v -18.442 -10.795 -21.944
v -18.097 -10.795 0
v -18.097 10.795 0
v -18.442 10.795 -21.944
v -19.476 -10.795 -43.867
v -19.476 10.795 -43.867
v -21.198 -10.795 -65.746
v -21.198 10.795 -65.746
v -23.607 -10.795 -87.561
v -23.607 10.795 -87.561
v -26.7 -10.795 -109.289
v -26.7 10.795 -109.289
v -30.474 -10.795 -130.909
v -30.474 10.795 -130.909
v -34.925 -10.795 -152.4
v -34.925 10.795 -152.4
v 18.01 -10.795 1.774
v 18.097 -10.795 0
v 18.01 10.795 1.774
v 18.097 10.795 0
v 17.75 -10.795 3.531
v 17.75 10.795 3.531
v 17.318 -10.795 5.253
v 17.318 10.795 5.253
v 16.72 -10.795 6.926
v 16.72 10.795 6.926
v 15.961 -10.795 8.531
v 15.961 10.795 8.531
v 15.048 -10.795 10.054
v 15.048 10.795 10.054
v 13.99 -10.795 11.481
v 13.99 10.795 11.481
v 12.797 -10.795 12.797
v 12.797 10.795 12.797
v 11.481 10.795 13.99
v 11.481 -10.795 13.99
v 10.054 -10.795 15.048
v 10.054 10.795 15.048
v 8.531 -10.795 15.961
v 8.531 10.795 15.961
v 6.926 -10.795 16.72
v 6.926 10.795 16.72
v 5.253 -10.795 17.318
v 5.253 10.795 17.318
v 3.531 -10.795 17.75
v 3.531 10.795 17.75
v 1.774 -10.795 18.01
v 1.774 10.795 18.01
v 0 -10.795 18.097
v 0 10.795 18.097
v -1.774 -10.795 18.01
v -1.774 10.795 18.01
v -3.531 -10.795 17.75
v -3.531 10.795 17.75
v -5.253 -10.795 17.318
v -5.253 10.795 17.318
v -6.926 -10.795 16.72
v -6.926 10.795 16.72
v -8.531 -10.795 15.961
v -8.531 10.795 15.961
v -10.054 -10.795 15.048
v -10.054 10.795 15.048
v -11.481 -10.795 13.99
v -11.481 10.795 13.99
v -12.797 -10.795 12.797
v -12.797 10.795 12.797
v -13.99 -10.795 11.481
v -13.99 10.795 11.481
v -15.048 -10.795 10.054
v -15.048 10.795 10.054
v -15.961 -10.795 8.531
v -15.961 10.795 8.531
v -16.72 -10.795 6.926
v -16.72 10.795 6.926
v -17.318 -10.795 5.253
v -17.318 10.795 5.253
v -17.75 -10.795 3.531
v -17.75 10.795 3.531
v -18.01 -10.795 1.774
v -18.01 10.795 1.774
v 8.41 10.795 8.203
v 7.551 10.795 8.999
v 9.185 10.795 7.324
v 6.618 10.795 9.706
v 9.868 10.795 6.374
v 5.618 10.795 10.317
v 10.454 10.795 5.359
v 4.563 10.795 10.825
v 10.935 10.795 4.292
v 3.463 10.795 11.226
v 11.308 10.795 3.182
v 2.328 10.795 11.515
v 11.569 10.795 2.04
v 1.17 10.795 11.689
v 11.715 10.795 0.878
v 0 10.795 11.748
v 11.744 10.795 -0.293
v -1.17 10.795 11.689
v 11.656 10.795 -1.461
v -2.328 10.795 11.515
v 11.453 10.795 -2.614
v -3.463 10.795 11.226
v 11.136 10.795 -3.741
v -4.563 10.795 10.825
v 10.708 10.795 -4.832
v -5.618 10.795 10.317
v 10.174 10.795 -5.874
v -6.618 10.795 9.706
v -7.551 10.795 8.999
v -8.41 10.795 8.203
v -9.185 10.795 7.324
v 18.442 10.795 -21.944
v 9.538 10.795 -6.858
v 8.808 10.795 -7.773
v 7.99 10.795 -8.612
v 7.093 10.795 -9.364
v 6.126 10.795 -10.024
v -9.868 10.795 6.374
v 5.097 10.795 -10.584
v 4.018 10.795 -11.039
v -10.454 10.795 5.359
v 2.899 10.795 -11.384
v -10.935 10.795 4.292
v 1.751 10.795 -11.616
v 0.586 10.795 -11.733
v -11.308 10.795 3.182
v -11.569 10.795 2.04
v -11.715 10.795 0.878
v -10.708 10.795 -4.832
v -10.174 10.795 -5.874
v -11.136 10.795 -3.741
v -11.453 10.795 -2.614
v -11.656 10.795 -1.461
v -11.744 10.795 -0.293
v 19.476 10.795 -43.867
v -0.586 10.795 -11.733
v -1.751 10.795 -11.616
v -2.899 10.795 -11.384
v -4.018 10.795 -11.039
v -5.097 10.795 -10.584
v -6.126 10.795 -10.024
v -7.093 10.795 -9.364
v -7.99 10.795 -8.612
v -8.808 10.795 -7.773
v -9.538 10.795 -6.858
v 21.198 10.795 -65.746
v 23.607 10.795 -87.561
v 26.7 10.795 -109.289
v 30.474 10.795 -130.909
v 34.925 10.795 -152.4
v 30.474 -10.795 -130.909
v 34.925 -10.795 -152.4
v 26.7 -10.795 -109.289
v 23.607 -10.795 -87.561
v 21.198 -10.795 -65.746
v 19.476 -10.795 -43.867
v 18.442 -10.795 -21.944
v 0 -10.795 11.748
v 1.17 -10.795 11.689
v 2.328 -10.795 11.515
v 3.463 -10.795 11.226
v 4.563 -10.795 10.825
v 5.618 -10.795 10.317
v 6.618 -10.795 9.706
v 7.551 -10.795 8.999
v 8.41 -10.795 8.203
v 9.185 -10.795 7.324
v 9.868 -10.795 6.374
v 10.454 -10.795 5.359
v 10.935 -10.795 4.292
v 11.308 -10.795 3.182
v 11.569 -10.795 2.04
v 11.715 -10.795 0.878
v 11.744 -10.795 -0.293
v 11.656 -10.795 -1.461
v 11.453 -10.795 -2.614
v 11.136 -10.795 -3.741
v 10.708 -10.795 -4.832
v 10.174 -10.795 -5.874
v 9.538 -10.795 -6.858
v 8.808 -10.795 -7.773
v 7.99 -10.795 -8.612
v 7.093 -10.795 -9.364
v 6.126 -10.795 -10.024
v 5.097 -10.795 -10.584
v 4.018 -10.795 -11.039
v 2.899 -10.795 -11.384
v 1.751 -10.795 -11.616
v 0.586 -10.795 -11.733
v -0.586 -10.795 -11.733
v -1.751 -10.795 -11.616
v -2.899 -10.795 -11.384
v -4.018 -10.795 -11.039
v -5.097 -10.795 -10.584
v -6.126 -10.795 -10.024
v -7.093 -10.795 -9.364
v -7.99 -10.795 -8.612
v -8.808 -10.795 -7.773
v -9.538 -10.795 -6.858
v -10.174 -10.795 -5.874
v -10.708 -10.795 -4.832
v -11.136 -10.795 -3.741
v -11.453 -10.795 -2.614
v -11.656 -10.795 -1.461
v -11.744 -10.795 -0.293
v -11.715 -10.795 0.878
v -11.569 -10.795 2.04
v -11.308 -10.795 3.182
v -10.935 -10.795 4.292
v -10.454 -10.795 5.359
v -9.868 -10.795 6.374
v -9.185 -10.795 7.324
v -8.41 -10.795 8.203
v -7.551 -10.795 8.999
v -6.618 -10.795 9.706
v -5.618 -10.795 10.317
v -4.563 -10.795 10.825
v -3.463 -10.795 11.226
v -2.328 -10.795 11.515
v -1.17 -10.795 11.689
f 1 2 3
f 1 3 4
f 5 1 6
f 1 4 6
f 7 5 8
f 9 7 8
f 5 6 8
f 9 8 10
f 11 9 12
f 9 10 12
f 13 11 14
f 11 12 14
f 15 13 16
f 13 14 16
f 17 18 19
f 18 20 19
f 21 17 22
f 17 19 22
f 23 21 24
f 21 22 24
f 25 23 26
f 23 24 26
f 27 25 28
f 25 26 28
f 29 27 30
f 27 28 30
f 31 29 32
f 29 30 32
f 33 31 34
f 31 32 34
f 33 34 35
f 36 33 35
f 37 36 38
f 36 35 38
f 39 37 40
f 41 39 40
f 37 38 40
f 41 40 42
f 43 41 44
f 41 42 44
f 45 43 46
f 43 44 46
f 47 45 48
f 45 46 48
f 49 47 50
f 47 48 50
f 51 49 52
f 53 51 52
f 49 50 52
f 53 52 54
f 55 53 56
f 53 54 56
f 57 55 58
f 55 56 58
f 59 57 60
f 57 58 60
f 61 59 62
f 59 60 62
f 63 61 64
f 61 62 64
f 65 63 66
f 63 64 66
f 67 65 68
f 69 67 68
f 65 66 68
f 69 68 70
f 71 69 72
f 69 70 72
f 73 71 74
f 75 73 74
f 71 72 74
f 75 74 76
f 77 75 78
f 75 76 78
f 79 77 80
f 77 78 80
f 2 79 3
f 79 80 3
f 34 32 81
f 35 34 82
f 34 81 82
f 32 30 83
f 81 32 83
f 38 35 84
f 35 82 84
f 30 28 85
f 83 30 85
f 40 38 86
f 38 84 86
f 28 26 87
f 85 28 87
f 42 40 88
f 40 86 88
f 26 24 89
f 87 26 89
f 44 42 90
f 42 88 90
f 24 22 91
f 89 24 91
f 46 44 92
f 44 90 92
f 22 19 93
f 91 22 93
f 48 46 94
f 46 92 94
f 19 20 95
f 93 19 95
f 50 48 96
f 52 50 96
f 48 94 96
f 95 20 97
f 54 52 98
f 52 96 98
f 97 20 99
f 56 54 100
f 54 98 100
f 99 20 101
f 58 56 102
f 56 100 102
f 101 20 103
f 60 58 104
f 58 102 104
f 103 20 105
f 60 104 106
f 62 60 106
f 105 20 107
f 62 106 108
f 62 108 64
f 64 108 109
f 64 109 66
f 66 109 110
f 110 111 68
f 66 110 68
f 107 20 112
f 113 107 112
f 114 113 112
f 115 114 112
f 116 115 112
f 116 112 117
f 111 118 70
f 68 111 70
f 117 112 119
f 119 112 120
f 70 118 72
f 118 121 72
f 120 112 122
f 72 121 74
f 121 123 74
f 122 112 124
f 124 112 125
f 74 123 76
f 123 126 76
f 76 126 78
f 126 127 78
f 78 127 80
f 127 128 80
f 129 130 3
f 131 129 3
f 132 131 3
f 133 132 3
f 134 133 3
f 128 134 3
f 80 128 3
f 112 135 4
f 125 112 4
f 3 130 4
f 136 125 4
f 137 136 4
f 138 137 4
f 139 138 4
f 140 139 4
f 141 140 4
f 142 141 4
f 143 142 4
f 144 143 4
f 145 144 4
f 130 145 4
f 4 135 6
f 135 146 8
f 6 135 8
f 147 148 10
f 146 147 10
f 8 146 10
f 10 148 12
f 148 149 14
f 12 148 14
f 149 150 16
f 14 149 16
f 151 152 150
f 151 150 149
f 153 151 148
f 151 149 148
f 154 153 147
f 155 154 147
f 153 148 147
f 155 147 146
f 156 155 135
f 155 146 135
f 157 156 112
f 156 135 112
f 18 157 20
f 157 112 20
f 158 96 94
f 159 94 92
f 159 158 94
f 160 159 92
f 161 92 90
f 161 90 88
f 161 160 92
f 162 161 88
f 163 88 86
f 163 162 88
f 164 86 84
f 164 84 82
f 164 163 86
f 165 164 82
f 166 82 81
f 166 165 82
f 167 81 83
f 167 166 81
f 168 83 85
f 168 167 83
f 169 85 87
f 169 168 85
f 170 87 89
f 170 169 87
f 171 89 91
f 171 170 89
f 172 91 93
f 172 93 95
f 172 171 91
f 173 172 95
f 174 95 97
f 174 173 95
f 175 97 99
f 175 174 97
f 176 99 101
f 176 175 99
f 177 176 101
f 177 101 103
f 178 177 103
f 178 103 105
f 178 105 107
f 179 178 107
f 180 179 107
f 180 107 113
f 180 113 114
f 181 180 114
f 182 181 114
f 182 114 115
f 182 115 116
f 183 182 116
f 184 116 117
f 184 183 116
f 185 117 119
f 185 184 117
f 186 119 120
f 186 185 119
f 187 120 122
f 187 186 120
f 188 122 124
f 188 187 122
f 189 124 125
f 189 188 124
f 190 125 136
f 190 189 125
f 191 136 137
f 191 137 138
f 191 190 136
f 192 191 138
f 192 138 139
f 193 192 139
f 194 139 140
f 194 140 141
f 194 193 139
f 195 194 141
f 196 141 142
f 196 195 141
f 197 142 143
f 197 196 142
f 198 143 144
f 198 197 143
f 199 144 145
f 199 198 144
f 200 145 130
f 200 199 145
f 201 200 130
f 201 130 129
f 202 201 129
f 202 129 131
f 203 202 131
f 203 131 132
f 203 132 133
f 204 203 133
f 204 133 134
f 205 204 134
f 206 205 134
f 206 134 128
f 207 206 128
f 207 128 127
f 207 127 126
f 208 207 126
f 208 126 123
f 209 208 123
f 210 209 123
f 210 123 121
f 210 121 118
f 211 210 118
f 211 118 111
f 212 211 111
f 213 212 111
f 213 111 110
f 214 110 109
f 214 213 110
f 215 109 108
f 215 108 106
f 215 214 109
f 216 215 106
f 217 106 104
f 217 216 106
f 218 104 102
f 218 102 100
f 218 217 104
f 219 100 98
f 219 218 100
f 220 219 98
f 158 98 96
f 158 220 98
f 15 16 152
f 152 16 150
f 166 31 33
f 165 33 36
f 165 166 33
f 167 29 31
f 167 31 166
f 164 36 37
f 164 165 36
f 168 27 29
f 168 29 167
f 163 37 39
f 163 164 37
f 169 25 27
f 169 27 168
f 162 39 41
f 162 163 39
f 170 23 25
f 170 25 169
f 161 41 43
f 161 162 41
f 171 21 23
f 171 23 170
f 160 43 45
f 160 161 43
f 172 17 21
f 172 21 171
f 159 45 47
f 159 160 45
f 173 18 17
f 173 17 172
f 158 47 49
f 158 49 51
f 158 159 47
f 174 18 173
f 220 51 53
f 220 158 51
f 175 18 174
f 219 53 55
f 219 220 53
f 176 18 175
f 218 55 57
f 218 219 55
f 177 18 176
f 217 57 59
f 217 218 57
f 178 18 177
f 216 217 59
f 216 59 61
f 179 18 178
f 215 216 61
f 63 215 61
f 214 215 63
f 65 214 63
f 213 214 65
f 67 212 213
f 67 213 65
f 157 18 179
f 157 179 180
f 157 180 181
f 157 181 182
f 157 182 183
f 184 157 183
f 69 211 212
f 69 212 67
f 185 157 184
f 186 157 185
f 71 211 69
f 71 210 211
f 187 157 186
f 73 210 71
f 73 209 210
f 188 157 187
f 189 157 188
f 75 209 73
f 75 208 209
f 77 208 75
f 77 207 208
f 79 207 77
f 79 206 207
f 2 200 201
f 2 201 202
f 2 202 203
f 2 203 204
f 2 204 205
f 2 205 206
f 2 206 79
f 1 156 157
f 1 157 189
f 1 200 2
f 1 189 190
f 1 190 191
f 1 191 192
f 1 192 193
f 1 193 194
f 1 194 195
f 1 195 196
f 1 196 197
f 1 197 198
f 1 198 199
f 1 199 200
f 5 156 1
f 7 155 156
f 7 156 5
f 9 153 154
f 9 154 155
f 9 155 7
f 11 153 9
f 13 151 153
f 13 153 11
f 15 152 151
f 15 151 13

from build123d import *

# Parameters (mm, degrees)
SKETCH1_R           = 11.7475
BOSS_EXTRUDE1_DEPTH = 10.795


with BuildPart() as part:
    # Sketch1 → Boss-Extrude1 (new, symmetric)
    with BuildSketch(Plane(origin=(0, 0, 0), x_dir=(1, 0, 0), z_dir=(0, 1, 0))):
        with BuildLine():
            Line((-34.925, 152.4), (34.925, 152.4))
            ThreePointArc((34.925, 152.4), (22.317119813, 76.663101875), (18.0975, 0))
            ThreePointArc((18.0975, 0), (0, -18.0975), (-18.0975, 0))
            ThreePointArc((-18.0975, 0), (-22.317119813, 76.663101875), (-34.925, 152.4))
        make_face()
        with Locations(Location((0, 0, 0), (0, 0, 270))):
            Circle(SKETCH1_R, mode=Mode.SUBTRACT)
    extrude(amount=BOSS_EXTRUDE1_DEPTH, both=True)


solid = part.part
